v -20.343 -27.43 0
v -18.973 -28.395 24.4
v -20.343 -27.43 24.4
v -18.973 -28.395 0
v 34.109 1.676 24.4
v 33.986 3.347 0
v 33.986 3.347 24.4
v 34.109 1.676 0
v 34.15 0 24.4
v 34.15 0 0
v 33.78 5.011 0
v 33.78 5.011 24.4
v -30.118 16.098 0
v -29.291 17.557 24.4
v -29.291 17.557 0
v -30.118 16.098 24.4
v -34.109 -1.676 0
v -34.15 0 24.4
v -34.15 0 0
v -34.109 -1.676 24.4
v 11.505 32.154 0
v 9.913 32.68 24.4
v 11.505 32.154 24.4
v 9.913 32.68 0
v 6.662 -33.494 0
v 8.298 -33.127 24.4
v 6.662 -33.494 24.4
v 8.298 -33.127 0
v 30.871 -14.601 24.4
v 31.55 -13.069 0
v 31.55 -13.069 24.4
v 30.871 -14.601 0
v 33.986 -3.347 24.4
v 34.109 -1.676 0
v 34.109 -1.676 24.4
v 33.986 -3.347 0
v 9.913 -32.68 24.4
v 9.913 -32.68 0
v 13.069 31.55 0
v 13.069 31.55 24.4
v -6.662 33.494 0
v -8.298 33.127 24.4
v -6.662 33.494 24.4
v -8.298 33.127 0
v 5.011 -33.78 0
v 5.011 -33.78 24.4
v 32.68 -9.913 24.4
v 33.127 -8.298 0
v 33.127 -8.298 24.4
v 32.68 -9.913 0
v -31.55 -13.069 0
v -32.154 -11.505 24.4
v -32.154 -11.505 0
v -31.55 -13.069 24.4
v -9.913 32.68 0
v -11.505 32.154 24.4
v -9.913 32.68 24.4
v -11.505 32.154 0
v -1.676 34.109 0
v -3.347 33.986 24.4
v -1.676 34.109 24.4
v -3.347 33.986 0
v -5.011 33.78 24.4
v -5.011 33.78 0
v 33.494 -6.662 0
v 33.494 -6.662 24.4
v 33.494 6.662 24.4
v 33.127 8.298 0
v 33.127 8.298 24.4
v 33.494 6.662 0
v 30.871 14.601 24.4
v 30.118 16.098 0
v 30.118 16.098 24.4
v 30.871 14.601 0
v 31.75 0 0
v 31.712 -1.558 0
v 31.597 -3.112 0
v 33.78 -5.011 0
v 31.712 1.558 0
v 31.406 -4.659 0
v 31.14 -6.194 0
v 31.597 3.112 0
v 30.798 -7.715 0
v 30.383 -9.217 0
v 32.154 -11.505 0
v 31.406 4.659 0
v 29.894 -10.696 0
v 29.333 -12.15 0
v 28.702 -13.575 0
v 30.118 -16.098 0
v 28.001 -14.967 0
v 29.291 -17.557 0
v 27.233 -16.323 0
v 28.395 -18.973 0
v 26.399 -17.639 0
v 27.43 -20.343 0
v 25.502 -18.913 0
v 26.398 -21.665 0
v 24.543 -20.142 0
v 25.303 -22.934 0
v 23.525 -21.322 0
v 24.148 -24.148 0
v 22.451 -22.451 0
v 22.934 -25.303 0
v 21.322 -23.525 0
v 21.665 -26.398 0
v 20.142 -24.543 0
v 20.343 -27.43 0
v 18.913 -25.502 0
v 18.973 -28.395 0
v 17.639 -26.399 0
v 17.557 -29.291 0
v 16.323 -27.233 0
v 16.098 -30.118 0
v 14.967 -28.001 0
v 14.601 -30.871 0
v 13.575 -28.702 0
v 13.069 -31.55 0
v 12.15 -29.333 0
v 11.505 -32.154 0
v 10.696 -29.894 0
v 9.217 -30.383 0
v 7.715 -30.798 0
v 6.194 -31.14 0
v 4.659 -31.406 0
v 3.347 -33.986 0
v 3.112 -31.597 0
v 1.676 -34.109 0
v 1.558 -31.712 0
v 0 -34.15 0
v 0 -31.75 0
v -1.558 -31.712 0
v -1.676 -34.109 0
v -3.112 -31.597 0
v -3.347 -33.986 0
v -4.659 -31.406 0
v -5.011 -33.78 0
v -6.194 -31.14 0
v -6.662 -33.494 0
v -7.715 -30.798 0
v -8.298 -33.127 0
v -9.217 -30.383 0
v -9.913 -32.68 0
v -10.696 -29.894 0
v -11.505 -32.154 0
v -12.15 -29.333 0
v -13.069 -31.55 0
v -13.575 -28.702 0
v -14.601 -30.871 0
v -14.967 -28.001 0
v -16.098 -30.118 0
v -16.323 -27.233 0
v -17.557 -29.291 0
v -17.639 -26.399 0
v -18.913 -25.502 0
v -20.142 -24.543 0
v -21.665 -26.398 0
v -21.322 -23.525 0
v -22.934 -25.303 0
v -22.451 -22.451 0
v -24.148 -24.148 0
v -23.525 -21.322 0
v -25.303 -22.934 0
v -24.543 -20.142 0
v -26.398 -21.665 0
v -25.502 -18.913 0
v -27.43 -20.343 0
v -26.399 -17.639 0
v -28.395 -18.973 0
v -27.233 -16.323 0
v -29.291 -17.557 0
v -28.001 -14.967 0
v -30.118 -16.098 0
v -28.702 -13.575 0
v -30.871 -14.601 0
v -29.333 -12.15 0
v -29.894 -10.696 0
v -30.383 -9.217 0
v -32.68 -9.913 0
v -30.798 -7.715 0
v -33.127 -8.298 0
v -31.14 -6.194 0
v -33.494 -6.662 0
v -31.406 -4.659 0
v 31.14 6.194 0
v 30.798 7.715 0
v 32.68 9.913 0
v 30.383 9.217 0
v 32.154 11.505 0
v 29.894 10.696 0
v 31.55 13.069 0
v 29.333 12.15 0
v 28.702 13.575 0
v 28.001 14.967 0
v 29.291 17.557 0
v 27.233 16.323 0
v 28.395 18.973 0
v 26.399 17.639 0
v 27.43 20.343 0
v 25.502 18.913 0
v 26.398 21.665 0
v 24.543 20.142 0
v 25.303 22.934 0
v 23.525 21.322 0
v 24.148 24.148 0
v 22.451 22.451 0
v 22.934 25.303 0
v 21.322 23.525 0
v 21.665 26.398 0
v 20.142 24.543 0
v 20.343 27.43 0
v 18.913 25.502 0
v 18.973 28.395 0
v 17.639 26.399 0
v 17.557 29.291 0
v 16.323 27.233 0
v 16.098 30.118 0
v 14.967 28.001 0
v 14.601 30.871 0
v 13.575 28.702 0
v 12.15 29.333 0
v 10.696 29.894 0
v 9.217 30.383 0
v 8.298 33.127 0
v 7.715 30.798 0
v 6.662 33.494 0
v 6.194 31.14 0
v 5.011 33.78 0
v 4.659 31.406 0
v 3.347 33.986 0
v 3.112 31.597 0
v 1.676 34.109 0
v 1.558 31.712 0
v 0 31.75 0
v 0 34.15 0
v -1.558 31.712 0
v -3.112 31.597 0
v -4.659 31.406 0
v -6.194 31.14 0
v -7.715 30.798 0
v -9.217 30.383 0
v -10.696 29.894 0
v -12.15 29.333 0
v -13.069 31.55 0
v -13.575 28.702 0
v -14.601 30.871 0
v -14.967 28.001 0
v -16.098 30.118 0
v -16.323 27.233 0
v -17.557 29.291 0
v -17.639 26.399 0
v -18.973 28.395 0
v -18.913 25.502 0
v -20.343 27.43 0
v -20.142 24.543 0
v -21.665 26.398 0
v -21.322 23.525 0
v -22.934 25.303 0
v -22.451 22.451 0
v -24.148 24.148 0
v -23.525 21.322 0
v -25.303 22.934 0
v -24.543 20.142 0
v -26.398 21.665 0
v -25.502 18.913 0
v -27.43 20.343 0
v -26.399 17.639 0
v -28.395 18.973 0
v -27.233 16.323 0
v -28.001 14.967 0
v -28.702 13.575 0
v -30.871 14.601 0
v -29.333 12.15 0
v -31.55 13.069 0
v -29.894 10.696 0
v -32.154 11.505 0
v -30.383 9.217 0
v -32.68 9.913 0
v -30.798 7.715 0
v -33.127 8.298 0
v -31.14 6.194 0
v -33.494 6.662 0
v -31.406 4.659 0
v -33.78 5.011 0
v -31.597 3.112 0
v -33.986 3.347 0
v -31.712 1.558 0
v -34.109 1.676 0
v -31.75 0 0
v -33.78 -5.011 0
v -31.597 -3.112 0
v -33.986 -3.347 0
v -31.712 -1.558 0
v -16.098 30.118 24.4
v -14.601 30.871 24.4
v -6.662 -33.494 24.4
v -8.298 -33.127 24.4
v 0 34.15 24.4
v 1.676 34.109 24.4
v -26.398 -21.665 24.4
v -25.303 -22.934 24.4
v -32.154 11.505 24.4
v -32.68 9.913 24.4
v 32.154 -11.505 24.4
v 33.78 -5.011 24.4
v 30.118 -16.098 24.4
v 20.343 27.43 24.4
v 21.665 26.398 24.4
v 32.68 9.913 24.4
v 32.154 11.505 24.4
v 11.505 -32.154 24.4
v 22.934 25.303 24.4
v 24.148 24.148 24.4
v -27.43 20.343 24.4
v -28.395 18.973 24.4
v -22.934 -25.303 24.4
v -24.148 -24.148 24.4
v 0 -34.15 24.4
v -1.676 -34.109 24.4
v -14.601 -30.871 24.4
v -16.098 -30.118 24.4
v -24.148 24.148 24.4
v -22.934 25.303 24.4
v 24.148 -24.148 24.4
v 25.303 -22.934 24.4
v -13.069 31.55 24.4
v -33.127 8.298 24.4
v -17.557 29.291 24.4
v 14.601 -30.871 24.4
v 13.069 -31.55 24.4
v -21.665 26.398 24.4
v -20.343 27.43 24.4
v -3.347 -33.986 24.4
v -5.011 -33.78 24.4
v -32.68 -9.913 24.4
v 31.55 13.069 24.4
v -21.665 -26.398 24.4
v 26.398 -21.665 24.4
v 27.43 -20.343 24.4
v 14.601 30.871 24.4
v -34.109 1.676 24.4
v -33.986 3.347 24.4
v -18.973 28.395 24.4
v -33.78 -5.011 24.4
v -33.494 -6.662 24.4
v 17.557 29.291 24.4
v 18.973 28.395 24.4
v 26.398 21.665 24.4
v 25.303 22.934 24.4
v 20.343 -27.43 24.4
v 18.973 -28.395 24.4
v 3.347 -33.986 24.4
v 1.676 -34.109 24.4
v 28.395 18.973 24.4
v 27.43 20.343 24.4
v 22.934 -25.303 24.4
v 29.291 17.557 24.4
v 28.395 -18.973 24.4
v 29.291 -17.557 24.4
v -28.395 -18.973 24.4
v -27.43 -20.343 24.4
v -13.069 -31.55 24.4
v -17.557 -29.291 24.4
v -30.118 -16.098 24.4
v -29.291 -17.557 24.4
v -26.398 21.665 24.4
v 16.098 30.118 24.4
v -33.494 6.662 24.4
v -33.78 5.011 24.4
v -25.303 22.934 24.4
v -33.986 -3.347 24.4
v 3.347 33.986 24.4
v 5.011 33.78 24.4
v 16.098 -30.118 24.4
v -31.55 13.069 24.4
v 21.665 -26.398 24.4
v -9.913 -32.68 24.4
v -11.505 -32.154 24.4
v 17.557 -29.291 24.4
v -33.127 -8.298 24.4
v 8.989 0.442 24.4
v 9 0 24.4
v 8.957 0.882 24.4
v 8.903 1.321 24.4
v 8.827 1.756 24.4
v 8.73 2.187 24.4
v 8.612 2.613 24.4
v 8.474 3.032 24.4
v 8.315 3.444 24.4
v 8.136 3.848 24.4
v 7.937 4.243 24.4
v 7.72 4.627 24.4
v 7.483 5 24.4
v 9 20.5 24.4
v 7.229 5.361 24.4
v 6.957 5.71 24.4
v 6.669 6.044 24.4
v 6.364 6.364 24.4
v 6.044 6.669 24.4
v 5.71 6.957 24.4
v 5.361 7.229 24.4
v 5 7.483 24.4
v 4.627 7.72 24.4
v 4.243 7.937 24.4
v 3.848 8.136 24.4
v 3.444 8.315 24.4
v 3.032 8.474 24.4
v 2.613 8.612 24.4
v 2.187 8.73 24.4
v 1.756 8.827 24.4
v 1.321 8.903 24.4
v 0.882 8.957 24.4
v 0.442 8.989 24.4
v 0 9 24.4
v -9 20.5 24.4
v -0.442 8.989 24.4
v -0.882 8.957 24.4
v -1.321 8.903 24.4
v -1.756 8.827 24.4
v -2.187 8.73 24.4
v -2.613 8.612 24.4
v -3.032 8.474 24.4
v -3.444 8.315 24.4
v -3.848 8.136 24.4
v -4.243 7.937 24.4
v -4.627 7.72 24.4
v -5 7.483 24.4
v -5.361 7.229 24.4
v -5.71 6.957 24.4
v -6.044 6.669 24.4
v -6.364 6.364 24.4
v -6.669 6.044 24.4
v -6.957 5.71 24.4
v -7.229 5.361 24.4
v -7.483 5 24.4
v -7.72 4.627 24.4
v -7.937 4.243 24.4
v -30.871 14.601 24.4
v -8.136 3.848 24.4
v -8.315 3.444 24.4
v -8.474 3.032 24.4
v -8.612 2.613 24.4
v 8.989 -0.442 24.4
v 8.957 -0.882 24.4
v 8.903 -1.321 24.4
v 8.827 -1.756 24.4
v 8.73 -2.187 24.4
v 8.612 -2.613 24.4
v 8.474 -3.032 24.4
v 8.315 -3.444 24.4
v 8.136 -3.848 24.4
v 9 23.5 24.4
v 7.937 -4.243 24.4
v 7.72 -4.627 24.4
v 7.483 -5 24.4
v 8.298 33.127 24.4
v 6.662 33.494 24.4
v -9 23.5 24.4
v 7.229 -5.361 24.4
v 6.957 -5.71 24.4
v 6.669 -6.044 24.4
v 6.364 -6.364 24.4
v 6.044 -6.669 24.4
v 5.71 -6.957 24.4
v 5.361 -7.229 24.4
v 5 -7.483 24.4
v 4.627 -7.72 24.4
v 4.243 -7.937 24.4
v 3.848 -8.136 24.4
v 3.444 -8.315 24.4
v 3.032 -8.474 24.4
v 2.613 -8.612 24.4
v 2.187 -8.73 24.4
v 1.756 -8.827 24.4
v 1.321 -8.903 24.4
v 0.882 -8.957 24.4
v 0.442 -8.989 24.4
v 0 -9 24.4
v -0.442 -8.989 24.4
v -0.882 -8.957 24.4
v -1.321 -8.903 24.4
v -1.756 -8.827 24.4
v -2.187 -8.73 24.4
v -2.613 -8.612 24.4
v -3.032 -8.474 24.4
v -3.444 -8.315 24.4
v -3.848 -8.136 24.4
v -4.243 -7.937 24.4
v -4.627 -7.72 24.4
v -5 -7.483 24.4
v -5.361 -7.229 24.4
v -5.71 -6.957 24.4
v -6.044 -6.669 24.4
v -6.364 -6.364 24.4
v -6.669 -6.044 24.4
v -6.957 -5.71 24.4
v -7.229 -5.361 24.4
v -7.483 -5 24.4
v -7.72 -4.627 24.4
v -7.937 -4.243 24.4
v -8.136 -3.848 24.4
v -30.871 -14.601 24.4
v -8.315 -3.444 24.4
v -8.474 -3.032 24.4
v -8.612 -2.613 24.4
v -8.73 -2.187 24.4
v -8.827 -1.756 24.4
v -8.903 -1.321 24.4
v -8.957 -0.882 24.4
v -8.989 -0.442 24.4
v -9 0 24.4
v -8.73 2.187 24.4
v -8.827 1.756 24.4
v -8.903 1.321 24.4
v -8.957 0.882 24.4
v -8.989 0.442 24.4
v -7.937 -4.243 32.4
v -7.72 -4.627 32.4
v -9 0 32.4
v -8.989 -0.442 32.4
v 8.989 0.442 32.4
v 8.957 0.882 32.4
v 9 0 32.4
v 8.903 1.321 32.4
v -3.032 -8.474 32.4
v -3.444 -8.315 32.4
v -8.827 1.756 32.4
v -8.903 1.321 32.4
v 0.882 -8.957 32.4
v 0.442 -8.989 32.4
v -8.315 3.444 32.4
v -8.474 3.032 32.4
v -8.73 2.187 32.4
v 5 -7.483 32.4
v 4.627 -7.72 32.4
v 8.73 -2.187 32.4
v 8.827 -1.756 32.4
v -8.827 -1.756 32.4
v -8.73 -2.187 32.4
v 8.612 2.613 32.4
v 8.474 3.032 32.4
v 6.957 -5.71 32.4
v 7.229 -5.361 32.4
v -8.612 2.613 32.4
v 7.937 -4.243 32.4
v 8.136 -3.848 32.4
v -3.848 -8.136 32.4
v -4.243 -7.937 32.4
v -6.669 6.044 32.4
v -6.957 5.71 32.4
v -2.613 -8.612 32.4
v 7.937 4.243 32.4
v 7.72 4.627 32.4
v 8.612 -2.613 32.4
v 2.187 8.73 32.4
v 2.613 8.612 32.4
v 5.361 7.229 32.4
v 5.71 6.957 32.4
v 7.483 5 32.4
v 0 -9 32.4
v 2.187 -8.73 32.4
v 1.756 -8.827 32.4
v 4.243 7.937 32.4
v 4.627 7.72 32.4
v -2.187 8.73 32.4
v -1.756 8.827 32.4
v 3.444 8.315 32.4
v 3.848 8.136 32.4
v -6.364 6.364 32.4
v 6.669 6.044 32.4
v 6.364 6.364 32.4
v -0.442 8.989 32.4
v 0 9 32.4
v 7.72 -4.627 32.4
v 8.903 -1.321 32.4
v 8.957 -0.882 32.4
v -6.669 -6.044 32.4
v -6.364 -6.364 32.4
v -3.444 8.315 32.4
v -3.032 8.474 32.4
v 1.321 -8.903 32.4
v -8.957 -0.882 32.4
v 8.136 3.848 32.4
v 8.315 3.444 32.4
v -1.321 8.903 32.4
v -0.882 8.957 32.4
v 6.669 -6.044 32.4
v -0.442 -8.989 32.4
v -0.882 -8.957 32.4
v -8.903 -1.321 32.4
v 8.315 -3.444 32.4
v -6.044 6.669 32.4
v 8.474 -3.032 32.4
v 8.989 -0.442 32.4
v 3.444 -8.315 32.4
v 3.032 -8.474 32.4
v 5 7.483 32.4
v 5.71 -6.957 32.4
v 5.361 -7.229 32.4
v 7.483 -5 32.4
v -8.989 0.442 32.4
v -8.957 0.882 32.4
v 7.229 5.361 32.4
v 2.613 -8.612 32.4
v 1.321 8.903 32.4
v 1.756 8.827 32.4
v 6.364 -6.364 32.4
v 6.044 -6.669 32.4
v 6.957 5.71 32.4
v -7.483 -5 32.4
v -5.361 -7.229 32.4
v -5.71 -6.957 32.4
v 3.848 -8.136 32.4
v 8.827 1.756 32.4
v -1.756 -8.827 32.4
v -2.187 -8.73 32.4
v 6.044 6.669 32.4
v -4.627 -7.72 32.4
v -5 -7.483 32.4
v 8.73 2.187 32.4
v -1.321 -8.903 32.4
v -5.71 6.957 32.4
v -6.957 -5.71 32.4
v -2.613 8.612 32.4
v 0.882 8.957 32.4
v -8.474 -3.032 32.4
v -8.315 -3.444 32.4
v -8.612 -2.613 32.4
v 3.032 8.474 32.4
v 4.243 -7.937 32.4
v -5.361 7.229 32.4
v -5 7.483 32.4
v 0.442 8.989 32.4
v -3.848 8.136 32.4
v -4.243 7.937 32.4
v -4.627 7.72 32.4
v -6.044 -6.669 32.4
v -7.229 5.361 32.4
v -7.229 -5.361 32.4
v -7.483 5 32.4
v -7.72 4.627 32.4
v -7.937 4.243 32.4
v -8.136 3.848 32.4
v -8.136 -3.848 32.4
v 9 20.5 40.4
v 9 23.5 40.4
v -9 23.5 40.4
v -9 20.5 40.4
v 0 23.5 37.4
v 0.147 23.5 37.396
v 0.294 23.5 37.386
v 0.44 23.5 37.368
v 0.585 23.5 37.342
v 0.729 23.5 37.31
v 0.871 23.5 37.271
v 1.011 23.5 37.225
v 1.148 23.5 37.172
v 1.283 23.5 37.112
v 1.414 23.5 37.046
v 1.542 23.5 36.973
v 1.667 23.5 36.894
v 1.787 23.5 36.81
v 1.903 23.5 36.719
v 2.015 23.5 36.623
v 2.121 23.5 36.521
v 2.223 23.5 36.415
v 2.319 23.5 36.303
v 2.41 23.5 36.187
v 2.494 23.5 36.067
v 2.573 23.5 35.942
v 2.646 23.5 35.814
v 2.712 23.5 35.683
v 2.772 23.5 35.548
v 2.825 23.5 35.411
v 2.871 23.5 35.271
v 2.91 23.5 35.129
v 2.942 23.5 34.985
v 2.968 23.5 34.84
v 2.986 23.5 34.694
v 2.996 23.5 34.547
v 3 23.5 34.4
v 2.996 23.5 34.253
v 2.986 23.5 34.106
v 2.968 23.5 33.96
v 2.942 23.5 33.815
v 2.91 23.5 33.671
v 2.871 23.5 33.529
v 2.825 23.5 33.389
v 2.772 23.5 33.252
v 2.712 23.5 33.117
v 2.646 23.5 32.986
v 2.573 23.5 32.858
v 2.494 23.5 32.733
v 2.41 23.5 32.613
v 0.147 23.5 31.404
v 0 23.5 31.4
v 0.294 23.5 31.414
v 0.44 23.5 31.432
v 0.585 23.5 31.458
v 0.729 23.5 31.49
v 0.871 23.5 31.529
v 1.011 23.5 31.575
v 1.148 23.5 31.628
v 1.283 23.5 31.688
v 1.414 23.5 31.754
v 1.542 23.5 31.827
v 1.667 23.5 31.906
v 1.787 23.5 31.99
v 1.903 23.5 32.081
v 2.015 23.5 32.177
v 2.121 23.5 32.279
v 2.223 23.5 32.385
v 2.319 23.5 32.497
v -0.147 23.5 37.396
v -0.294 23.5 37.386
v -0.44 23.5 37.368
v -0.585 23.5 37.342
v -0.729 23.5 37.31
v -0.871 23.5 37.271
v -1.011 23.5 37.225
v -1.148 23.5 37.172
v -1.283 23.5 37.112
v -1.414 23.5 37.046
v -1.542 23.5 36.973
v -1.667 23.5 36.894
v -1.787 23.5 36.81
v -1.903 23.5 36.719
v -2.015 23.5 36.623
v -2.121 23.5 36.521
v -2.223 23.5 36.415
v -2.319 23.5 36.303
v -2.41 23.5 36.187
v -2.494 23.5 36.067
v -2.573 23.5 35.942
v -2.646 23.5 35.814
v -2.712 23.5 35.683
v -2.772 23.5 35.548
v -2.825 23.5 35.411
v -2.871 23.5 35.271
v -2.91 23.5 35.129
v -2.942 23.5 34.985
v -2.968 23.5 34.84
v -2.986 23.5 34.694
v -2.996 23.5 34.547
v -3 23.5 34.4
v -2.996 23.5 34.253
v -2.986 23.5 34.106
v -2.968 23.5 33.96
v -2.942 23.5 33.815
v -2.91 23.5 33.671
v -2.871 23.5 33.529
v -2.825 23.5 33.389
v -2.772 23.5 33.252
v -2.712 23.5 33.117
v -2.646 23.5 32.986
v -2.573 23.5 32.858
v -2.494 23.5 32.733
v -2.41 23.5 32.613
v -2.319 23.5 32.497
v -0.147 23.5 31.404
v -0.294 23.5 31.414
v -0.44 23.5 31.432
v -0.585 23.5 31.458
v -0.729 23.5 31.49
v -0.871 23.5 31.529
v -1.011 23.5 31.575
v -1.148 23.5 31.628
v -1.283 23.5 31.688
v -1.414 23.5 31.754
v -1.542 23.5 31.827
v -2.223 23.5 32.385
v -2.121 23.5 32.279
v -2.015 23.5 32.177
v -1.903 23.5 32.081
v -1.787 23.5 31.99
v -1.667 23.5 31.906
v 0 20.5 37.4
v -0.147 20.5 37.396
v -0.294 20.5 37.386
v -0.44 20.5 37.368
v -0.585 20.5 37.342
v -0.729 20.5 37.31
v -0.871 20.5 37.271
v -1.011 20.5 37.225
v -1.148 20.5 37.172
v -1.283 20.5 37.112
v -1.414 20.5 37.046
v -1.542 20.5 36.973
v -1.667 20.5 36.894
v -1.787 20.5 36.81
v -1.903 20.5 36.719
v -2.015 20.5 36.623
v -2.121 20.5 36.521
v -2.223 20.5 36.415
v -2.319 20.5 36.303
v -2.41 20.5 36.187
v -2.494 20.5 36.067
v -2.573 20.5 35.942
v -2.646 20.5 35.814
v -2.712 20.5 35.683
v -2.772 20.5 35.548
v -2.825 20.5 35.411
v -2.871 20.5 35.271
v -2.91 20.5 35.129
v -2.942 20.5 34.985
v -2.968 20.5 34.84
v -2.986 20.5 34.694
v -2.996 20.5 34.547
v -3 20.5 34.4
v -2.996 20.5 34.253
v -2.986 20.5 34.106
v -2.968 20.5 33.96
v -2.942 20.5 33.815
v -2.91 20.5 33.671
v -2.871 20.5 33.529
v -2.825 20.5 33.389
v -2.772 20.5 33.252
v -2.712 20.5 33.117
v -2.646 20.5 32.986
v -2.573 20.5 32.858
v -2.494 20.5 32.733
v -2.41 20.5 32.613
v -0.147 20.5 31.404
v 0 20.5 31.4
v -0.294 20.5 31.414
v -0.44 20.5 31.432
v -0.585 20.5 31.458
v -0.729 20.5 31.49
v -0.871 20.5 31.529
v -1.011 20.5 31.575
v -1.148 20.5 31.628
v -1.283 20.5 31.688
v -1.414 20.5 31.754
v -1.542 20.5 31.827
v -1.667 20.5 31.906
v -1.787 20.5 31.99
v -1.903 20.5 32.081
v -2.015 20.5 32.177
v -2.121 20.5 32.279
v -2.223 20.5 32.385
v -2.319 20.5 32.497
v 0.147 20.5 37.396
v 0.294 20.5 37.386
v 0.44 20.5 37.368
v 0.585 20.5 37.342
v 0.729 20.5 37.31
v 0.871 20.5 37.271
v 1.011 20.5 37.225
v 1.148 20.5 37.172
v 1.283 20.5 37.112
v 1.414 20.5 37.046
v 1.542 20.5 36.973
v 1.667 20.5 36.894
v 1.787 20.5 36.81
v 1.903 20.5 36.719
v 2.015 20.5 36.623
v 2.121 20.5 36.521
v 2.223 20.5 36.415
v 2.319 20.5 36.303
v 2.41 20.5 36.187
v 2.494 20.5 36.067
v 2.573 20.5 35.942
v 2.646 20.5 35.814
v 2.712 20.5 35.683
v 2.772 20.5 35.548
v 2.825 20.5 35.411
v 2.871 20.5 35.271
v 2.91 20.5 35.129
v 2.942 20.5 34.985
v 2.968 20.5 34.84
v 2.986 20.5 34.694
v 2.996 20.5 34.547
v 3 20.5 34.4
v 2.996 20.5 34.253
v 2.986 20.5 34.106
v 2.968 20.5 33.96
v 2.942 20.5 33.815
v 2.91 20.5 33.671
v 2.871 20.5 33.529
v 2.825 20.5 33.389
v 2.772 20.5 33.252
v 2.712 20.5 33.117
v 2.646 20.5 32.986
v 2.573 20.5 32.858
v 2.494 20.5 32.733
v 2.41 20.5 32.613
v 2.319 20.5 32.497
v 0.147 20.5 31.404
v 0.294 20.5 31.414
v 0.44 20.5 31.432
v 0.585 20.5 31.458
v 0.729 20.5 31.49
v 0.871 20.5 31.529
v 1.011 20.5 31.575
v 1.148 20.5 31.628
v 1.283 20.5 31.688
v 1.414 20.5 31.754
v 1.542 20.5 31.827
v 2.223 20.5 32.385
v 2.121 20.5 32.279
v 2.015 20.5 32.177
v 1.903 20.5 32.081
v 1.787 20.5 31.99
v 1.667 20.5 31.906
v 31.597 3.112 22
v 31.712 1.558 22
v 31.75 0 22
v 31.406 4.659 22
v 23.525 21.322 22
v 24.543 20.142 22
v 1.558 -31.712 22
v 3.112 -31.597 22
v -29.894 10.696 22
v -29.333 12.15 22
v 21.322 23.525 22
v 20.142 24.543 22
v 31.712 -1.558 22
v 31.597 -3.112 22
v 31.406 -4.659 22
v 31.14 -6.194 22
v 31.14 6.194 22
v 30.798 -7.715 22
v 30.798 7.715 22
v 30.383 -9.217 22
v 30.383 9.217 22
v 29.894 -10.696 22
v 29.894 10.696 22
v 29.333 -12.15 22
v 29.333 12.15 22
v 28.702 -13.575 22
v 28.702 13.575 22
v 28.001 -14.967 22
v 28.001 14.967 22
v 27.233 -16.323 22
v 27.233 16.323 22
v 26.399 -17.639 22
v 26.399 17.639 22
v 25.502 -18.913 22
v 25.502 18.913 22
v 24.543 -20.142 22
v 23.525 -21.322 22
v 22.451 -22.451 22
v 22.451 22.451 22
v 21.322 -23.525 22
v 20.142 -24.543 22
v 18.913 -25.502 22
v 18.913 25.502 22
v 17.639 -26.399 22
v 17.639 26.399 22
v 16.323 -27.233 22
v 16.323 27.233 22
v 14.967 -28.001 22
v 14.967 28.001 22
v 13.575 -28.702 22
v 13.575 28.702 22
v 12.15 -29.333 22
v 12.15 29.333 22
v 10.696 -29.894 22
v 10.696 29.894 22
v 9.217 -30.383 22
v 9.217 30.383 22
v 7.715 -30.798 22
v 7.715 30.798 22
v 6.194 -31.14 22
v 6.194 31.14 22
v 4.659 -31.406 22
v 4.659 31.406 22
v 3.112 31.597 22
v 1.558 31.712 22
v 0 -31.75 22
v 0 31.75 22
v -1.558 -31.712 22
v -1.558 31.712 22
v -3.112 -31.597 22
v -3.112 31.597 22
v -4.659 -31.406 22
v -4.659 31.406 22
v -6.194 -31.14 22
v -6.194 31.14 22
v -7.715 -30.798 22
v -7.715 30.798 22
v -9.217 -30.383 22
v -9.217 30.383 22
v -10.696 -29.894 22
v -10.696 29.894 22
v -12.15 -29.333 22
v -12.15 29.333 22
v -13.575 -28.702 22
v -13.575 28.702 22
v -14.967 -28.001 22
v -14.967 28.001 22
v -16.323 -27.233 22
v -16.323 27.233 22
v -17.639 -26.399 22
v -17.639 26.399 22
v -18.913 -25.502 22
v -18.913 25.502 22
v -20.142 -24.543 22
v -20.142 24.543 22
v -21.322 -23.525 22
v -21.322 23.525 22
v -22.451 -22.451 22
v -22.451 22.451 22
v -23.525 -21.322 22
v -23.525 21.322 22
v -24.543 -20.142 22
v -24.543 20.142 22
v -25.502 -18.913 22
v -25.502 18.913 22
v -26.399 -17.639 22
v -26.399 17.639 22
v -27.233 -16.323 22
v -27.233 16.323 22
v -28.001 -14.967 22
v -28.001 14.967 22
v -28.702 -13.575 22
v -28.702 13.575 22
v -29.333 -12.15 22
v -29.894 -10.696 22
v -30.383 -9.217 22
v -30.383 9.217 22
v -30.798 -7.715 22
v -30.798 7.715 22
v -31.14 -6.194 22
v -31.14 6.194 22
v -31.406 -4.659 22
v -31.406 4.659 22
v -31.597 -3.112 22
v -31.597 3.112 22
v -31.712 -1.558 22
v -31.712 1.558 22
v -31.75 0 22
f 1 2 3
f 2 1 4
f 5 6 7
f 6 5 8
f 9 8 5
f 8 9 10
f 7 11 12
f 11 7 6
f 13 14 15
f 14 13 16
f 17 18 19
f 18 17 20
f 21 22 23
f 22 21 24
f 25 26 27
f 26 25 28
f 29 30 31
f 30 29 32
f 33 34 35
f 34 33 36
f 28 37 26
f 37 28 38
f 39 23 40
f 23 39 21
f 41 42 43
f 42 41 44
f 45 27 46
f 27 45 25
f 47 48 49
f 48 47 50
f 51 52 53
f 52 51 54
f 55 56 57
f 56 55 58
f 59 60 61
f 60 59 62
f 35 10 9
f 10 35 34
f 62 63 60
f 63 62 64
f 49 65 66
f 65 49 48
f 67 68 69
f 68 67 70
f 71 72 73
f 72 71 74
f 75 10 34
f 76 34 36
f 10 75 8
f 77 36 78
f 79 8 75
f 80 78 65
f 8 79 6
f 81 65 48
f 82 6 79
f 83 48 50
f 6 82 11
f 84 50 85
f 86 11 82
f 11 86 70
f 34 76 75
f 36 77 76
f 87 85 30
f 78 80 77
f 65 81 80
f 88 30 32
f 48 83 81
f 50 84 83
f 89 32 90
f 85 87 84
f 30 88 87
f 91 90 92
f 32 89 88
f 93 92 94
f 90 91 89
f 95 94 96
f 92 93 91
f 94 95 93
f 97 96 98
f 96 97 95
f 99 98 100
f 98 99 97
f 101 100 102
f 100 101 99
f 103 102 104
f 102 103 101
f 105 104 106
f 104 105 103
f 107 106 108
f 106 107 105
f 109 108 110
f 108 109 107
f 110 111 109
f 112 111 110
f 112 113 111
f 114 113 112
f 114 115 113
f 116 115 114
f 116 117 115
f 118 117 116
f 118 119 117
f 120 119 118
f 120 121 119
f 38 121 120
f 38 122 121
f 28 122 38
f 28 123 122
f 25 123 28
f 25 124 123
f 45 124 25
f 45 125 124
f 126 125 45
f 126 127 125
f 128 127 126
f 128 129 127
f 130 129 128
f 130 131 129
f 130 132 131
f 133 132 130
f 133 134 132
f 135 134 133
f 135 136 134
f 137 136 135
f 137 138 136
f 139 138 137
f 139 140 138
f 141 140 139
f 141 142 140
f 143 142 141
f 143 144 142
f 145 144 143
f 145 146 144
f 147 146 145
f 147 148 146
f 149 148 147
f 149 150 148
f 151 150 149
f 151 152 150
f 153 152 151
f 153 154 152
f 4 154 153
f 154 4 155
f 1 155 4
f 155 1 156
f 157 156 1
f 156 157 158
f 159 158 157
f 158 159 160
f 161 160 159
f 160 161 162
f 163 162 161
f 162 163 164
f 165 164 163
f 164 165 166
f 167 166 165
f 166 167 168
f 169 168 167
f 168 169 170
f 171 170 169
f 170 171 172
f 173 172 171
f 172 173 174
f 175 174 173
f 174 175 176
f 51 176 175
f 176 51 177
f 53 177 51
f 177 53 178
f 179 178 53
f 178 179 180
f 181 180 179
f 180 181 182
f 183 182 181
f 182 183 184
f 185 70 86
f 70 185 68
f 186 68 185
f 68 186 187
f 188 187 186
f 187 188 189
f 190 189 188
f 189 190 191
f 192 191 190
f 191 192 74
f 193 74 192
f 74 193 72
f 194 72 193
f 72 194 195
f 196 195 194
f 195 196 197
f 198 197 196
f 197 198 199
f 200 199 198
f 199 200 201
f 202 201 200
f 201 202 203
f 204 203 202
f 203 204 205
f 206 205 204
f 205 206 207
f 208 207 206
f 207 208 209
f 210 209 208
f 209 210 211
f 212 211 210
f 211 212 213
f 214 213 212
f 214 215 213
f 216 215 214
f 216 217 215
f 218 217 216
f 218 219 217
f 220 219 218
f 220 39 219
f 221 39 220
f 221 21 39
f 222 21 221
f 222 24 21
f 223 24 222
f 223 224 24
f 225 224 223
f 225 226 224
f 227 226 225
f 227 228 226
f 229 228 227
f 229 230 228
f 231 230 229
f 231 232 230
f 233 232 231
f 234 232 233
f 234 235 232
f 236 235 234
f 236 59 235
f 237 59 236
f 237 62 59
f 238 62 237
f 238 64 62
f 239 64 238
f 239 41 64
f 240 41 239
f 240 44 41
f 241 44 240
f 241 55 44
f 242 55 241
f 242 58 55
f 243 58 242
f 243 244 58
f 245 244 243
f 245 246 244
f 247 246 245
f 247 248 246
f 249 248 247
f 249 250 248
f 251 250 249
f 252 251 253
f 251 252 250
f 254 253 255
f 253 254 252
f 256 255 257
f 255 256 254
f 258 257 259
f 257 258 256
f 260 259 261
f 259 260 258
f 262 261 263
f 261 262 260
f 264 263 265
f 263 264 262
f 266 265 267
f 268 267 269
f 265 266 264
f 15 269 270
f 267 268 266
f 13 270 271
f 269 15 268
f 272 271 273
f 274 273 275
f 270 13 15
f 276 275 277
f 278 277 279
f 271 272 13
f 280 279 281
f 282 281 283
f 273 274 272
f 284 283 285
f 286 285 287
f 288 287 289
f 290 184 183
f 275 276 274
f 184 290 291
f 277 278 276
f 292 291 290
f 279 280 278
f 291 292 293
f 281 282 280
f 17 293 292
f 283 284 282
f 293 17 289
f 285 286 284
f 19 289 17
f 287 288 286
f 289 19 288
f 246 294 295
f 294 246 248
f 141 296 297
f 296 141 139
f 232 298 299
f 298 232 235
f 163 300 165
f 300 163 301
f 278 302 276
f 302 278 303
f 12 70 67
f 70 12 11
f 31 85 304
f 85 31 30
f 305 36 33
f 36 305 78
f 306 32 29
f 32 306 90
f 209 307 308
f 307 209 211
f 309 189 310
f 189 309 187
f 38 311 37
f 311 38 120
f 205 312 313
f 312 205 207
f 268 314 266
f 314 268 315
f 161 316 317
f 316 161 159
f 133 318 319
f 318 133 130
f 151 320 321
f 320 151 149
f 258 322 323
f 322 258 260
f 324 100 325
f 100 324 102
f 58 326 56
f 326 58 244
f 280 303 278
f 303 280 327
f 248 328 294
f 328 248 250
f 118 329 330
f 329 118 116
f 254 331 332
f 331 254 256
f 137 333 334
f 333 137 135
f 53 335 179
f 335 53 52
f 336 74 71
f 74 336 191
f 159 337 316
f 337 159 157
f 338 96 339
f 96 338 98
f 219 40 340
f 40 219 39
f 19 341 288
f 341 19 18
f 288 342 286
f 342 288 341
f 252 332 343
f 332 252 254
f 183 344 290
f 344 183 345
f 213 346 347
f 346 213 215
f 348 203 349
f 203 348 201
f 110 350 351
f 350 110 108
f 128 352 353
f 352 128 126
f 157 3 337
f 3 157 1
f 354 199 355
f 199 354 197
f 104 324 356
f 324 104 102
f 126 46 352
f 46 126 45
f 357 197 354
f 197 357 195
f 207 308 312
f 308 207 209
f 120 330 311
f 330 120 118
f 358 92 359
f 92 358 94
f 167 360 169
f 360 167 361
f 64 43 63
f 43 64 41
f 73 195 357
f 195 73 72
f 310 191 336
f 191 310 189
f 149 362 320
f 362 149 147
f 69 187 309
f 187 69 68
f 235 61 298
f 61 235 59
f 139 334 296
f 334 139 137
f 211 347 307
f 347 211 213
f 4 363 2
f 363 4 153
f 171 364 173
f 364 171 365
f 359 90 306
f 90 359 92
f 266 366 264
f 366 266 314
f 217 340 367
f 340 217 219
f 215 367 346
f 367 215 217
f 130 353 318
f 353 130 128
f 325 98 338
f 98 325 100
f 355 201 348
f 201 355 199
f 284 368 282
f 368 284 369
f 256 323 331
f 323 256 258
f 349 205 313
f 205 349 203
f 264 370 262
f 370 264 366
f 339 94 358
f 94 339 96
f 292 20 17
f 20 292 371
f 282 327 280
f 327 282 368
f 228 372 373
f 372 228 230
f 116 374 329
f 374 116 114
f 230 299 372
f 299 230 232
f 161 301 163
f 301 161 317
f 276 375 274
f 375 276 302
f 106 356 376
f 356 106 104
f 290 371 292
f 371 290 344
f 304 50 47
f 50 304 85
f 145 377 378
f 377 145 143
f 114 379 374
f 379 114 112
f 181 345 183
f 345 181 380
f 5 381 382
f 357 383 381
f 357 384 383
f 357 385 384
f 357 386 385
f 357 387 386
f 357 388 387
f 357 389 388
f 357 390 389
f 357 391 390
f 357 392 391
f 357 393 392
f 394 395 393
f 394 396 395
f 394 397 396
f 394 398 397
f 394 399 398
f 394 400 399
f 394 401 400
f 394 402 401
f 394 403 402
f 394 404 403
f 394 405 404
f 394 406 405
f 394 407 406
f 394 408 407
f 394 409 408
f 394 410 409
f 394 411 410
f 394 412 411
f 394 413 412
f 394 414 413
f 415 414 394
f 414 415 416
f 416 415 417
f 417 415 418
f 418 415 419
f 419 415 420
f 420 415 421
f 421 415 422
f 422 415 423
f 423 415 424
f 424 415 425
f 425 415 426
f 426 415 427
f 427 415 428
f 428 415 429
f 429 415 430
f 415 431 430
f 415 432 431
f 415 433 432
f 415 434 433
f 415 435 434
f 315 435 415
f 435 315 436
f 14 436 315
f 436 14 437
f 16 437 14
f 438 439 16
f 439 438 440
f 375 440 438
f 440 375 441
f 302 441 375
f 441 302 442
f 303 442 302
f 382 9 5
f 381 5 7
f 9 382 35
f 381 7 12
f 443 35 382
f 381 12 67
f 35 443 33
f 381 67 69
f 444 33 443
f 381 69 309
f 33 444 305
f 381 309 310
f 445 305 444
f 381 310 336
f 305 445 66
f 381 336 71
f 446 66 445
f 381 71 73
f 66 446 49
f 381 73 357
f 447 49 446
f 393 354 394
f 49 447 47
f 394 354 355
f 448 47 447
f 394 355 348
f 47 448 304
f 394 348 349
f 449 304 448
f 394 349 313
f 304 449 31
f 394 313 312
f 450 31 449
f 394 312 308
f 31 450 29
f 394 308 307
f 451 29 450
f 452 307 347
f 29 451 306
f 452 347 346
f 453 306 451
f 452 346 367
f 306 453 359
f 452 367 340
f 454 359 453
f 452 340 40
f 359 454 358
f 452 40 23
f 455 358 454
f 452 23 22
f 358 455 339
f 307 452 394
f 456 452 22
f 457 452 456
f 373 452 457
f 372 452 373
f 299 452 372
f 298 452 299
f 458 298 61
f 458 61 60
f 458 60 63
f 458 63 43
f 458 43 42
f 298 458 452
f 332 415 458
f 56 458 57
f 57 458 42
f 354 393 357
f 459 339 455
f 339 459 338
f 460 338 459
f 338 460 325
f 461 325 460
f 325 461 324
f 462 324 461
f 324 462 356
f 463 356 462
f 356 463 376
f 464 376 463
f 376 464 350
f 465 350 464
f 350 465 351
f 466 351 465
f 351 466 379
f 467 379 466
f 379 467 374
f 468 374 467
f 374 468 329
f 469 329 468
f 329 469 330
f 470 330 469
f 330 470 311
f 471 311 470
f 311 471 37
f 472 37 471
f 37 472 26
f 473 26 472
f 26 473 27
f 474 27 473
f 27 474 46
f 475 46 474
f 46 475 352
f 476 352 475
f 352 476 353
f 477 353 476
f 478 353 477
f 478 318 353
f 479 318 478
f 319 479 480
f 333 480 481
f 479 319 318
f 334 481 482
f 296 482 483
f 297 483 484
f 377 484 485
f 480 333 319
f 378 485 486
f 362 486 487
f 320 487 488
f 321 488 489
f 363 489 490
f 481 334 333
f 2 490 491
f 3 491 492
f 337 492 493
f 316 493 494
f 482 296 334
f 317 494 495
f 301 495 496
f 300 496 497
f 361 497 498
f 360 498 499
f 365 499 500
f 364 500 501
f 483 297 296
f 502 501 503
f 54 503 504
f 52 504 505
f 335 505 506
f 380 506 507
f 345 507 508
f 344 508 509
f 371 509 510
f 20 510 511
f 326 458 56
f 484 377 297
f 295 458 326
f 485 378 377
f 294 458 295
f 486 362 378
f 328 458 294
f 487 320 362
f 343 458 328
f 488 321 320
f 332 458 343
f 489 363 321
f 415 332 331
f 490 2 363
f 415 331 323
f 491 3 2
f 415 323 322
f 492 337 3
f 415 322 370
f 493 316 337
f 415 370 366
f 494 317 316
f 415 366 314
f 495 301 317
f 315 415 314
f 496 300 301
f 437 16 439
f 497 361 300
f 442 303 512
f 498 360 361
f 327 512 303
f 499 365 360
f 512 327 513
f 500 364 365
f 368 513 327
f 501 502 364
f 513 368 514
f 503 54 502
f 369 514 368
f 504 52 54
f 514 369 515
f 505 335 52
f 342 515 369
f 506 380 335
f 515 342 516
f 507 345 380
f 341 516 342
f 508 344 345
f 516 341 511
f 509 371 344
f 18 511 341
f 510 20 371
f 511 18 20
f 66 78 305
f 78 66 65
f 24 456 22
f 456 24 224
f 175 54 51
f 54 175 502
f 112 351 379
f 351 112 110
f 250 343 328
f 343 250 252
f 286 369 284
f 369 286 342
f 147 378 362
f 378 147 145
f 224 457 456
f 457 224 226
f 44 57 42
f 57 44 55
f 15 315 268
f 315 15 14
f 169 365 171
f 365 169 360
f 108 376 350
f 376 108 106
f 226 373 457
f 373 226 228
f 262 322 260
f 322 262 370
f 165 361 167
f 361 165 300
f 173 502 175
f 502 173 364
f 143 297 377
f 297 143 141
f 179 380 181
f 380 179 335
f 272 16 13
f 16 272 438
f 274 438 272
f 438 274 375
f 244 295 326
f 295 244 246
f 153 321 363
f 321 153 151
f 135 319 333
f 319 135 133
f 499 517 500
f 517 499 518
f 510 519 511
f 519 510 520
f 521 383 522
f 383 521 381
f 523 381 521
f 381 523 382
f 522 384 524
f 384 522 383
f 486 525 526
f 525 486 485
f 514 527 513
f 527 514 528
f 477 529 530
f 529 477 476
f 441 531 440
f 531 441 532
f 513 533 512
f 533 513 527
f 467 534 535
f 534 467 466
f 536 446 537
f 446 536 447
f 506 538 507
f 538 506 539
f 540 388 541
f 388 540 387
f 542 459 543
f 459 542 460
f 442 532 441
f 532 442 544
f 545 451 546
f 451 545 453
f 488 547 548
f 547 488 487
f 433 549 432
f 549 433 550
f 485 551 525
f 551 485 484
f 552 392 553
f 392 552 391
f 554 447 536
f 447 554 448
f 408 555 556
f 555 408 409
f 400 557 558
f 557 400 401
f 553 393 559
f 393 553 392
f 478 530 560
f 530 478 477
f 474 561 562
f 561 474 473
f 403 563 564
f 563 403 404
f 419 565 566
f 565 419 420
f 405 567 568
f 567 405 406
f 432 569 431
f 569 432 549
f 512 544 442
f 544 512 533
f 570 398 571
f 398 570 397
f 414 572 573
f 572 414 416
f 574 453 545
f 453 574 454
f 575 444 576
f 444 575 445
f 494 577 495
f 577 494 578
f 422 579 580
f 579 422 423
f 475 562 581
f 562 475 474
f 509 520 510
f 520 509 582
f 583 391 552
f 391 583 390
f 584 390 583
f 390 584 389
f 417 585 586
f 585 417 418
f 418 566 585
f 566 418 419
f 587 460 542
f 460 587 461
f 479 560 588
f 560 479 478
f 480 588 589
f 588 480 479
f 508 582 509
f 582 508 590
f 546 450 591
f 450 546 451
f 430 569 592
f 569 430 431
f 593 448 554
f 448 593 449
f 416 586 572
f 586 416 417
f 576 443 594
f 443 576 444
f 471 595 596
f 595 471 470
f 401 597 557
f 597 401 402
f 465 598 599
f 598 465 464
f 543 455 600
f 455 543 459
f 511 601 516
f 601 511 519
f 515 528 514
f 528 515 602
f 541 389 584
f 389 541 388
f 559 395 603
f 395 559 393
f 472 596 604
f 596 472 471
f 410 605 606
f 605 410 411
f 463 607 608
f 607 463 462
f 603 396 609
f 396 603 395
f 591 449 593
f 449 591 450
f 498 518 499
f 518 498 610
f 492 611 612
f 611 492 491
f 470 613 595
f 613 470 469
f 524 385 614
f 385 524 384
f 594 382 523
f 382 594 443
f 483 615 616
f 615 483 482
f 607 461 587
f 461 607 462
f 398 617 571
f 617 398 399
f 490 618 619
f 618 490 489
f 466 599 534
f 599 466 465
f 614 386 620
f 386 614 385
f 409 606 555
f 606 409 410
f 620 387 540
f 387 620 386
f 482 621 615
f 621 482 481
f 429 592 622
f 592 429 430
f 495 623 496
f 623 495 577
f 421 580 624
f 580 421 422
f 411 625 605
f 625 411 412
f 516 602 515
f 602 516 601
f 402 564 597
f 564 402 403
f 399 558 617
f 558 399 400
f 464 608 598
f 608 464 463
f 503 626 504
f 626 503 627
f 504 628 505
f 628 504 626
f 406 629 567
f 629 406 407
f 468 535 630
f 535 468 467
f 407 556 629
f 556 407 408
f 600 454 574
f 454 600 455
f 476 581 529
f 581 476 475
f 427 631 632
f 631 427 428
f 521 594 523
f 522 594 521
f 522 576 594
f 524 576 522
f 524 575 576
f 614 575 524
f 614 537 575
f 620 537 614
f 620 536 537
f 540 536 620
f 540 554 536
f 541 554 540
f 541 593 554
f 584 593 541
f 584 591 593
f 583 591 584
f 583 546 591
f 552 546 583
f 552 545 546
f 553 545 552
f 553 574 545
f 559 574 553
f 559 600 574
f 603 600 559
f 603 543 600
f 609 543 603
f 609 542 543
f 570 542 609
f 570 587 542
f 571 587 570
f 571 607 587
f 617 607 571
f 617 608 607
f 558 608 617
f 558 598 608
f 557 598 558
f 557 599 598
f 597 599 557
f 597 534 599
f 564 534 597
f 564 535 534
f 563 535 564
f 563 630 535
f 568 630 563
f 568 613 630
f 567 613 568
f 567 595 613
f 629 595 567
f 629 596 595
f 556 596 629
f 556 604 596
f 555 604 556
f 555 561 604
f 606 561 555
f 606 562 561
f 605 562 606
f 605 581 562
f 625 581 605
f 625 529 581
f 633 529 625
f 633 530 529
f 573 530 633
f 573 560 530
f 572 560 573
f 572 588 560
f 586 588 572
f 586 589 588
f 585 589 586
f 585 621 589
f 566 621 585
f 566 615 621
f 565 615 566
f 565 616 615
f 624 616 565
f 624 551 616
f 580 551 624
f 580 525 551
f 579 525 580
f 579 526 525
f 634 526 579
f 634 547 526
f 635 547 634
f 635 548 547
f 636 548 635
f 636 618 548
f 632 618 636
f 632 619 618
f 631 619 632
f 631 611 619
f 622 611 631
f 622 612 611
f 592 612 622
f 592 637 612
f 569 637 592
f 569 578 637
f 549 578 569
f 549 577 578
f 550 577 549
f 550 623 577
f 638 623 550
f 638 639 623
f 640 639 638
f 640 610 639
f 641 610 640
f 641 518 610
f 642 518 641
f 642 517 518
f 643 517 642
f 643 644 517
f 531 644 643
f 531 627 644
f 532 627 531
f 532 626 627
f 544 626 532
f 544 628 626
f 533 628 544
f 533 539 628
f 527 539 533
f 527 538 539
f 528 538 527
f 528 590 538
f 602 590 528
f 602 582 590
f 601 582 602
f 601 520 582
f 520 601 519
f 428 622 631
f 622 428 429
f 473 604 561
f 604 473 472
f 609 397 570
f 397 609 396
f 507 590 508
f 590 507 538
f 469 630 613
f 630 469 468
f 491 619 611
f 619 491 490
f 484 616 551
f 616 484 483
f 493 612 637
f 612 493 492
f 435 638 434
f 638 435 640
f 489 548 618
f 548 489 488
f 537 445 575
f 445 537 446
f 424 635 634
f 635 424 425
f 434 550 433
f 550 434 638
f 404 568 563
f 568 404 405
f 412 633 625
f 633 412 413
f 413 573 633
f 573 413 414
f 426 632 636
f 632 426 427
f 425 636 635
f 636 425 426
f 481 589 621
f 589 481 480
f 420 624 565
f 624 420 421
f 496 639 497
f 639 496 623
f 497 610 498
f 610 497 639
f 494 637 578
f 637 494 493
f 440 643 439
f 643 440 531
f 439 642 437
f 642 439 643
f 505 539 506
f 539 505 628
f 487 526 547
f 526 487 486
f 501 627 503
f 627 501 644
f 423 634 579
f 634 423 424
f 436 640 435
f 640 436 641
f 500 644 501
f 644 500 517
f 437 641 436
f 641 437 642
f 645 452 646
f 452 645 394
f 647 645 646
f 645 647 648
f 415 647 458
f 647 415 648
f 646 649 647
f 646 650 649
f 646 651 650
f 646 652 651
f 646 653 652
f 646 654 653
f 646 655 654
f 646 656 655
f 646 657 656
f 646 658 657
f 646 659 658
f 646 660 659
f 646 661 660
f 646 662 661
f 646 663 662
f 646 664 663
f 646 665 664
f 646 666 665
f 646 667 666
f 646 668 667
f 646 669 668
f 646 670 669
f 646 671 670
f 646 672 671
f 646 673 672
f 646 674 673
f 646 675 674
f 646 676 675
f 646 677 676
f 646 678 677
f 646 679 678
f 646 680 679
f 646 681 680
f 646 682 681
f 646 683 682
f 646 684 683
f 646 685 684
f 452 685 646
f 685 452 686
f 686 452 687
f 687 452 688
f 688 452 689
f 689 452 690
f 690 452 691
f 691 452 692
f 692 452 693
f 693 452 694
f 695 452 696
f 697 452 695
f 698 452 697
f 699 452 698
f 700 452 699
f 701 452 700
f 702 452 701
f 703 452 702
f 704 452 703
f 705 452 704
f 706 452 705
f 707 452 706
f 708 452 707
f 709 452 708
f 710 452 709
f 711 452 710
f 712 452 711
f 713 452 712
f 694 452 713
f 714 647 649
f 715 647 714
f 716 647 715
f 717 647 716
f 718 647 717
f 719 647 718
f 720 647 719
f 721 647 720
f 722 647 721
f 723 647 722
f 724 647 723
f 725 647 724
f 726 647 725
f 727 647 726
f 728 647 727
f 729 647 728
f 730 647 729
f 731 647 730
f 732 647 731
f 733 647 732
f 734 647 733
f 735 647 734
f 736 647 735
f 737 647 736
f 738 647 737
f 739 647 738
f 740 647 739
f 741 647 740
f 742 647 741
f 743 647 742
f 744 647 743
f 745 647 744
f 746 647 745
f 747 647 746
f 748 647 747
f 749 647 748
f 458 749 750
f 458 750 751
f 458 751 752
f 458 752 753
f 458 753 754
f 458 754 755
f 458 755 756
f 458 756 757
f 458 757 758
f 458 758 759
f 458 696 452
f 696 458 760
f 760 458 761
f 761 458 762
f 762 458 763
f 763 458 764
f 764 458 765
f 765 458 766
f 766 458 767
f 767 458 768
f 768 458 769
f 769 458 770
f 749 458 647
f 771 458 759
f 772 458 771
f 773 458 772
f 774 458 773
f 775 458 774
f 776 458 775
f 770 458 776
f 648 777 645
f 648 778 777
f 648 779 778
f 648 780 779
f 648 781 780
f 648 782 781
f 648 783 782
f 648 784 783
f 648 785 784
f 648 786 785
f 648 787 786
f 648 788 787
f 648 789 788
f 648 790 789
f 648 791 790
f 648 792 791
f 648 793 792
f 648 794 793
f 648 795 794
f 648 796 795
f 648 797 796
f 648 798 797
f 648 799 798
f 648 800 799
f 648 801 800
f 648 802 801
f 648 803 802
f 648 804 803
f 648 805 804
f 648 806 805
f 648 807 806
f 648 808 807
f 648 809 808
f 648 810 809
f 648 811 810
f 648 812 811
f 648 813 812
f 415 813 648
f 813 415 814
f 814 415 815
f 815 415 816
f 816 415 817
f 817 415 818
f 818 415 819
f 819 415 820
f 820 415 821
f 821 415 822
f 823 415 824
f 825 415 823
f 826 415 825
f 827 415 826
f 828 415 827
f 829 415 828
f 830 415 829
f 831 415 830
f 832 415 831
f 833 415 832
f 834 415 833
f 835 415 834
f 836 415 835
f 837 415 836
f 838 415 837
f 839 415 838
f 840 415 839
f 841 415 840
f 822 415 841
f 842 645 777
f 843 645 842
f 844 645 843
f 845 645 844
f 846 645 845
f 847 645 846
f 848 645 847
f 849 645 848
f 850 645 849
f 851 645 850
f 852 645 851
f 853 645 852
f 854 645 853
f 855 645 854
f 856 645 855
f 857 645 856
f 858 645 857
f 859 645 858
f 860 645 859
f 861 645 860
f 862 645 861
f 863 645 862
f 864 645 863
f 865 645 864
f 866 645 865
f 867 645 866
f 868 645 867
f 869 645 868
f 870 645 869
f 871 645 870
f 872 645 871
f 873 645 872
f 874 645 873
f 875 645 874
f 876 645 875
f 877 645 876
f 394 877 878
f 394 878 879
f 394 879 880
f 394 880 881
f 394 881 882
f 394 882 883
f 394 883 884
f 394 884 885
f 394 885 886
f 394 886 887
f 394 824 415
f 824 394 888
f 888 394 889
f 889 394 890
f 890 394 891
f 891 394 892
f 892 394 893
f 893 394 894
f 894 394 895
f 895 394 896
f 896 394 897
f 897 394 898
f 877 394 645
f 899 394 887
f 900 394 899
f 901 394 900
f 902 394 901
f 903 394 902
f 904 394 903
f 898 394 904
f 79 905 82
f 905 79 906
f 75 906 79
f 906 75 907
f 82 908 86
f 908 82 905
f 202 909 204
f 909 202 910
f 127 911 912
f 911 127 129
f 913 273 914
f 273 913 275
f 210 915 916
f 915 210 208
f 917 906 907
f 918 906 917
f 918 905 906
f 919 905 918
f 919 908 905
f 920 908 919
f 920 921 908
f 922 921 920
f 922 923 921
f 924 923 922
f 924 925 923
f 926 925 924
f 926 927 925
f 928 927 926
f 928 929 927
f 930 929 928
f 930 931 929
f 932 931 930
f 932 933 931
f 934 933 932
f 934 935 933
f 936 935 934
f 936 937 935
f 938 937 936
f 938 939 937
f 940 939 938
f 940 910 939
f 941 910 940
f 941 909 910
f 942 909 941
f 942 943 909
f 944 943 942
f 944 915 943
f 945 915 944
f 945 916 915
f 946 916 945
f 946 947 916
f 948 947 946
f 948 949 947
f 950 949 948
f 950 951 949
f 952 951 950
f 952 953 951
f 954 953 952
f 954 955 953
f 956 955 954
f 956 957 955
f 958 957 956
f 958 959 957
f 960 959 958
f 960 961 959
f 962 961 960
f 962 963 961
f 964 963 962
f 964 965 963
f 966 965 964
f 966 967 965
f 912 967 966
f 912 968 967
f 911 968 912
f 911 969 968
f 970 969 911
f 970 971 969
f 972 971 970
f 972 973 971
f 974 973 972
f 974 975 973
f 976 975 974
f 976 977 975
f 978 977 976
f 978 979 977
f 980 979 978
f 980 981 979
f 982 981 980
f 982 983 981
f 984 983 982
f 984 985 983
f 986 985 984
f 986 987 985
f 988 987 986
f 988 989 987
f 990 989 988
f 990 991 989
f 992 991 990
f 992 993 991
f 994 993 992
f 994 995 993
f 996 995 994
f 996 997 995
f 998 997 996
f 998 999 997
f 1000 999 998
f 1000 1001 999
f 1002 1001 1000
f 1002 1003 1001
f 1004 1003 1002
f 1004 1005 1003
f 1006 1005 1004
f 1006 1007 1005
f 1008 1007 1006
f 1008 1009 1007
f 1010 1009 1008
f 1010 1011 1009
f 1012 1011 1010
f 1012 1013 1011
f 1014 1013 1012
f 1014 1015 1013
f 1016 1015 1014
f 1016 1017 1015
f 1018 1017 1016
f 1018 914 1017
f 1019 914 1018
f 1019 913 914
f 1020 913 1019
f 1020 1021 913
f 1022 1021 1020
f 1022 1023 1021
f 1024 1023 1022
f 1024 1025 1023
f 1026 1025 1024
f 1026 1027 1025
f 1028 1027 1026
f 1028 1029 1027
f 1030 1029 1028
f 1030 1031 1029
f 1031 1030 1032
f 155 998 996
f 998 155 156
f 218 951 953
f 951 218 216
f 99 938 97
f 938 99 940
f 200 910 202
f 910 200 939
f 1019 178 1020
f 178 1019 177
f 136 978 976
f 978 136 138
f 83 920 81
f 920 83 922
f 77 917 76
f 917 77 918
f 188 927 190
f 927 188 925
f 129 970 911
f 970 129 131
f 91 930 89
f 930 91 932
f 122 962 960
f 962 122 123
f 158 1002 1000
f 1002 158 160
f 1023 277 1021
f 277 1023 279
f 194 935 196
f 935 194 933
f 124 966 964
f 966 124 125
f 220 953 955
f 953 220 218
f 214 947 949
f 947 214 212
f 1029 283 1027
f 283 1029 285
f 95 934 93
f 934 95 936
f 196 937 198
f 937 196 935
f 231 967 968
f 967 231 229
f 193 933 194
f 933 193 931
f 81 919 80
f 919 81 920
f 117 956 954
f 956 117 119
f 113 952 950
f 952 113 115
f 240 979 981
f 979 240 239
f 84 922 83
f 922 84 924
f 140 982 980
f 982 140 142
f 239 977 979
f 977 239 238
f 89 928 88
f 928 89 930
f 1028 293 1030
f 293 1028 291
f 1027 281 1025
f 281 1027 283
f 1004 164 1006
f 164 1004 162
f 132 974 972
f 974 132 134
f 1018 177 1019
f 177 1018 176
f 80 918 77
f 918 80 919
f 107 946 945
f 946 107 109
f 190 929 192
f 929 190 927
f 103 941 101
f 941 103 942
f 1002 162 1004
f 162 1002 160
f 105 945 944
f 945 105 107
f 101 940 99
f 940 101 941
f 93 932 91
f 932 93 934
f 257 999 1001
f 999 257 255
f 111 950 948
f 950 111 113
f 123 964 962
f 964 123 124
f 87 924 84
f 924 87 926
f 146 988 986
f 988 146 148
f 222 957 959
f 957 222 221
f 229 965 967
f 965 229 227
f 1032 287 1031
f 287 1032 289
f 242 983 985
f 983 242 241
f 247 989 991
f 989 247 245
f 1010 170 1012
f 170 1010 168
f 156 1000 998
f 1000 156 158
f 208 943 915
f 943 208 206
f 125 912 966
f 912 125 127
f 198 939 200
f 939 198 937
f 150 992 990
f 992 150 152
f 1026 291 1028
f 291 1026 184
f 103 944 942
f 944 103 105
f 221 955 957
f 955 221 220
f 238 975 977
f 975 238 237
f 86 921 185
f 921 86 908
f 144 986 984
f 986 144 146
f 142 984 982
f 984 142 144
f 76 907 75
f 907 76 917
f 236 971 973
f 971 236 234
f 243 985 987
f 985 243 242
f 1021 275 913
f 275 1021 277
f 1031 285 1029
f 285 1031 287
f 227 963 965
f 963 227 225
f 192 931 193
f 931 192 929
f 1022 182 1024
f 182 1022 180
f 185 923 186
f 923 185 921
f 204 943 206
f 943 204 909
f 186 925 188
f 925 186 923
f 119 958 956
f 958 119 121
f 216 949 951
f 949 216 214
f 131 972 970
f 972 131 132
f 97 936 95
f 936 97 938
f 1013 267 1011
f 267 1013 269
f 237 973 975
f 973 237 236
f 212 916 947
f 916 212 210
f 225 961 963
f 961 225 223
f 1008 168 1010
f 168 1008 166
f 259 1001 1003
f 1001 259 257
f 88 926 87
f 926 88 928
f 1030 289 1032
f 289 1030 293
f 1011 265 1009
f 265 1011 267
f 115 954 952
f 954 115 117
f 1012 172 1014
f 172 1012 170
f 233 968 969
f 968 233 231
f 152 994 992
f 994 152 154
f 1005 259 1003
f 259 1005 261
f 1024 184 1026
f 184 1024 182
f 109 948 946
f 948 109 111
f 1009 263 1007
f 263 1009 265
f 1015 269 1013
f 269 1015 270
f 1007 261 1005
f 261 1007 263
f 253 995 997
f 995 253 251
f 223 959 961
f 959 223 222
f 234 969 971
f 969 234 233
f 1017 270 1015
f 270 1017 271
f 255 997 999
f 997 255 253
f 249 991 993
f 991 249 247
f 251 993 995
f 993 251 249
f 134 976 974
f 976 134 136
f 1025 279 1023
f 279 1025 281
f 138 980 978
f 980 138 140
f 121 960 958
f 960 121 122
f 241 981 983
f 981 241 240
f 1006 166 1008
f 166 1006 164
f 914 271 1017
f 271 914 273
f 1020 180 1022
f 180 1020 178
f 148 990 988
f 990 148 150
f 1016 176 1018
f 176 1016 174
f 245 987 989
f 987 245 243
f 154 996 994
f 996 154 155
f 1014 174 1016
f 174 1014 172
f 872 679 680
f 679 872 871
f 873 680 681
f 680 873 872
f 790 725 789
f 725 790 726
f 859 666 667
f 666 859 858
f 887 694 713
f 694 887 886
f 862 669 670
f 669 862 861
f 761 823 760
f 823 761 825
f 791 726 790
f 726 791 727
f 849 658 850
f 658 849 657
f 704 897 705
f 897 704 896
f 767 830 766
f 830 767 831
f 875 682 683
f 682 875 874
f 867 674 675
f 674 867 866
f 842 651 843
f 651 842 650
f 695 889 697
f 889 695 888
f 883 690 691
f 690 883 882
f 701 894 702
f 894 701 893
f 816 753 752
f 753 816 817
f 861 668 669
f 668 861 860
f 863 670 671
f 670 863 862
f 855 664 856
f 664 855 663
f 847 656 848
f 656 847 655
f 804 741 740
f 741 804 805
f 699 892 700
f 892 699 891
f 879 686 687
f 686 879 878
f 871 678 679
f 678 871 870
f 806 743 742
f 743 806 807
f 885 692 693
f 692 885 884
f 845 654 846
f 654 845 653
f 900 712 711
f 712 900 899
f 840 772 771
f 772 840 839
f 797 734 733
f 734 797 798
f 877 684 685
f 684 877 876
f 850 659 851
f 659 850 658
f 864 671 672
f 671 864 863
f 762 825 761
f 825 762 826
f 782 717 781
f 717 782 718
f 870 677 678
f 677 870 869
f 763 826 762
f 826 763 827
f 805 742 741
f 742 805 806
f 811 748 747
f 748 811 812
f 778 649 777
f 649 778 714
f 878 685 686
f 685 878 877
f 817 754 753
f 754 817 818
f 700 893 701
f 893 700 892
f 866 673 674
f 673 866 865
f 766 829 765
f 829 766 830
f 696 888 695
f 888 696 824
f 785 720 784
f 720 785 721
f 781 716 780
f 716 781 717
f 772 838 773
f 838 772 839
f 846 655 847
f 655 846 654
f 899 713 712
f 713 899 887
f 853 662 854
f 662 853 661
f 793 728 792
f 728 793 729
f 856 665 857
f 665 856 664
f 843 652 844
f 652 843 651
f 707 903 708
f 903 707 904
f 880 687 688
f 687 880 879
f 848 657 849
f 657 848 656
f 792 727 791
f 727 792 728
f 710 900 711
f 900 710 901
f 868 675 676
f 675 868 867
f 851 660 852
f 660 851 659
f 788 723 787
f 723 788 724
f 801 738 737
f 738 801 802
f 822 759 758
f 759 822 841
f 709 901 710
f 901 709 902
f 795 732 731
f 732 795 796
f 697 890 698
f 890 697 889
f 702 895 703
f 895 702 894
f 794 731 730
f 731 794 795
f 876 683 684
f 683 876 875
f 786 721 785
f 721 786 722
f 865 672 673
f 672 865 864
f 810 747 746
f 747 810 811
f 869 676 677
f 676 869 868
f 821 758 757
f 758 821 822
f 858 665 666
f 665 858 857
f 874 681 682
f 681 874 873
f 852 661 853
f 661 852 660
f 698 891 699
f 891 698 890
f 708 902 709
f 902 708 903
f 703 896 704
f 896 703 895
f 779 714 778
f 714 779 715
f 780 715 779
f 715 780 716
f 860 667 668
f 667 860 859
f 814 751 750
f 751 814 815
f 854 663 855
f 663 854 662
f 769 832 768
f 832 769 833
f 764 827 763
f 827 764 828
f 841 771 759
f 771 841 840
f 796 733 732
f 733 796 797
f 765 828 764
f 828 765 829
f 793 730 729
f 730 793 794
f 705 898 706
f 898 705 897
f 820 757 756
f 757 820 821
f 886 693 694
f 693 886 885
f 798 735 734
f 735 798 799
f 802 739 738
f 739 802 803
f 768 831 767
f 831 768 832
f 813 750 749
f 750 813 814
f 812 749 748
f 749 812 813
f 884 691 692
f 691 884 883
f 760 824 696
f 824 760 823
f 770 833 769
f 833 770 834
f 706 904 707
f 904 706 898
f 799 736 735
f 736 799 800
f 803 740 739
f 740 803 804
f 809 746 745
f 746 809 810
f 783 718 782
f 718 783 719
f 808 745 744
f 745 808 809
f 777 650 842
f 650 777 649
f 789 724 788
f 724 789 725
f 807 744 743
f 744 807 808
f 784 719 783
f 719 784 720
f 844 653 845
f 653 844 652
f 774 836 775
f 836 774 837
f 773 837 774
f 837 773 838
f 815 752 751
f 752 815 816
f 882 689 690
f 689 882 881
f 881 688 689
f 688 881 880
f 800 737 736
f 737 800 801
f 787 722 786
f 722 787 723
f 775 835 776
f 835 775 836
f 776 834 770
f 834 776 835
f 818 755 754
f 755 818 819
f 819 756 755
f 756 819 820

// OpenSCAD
// Comandante C40 body dust cap (v1)
// Storage cap: swaps with the stock lid and covers the body's top opening
// so dust stays out of the grinding chamber while the grinder is stored.
// The grounds jar needs no cap — it is stored upside down.
// Units: mm. Printed open-side down (top disc on the bed), no supports.
// Tune inner_d after measuring the body (nominal ~61, prints suggested 62-63).

inner_d = 63.5;   // inner diameter (body outer + clearance)
depth = 22;       // inner depth (how far the cap drops over the body)
wall = 2.4;       // wall and top thickness
knob_d = 18;      // top knob diameter
knob_h = 8;       // top knob height
tab_w = 18;       // hanging tab width
tab_t = 3;        // hanging tab thickness
tab_h = 16;       // hanging tab height above the top face
tab_hole = 6;     // hanging hole diameter
tab_r = 22;       // tab centre distance from the cap centre

$fn = 128;

outer_d = inner_d + wall * 2;
top_z = depth + wall;

difference() {
    union() {
        cylinder(h = top_z, d = outer_d);
        translate([0, 0, top_z]) cylinder(h = knob_h, d = knob_d);
        // hanging tab: stands on the top face near the rim,
        // hangs on the stand's arm while the grinder is in use
        translate([-tab_w / 2, tab_r - tab_t / 2, top_z - 2])
            cube([tab_w, tab_t, tab_h + 2]);
    }
    translate([0, 0, -1]) cylinder(h = depth + 1, d = inner_d);
    // hanging hole through the tab
    translate([0, tab_r, top_z + tab_h - 6])
        rotate([90, 0, 0]) cylinder(h = tab_t + 2, d = tab_hole, center = true);
}
